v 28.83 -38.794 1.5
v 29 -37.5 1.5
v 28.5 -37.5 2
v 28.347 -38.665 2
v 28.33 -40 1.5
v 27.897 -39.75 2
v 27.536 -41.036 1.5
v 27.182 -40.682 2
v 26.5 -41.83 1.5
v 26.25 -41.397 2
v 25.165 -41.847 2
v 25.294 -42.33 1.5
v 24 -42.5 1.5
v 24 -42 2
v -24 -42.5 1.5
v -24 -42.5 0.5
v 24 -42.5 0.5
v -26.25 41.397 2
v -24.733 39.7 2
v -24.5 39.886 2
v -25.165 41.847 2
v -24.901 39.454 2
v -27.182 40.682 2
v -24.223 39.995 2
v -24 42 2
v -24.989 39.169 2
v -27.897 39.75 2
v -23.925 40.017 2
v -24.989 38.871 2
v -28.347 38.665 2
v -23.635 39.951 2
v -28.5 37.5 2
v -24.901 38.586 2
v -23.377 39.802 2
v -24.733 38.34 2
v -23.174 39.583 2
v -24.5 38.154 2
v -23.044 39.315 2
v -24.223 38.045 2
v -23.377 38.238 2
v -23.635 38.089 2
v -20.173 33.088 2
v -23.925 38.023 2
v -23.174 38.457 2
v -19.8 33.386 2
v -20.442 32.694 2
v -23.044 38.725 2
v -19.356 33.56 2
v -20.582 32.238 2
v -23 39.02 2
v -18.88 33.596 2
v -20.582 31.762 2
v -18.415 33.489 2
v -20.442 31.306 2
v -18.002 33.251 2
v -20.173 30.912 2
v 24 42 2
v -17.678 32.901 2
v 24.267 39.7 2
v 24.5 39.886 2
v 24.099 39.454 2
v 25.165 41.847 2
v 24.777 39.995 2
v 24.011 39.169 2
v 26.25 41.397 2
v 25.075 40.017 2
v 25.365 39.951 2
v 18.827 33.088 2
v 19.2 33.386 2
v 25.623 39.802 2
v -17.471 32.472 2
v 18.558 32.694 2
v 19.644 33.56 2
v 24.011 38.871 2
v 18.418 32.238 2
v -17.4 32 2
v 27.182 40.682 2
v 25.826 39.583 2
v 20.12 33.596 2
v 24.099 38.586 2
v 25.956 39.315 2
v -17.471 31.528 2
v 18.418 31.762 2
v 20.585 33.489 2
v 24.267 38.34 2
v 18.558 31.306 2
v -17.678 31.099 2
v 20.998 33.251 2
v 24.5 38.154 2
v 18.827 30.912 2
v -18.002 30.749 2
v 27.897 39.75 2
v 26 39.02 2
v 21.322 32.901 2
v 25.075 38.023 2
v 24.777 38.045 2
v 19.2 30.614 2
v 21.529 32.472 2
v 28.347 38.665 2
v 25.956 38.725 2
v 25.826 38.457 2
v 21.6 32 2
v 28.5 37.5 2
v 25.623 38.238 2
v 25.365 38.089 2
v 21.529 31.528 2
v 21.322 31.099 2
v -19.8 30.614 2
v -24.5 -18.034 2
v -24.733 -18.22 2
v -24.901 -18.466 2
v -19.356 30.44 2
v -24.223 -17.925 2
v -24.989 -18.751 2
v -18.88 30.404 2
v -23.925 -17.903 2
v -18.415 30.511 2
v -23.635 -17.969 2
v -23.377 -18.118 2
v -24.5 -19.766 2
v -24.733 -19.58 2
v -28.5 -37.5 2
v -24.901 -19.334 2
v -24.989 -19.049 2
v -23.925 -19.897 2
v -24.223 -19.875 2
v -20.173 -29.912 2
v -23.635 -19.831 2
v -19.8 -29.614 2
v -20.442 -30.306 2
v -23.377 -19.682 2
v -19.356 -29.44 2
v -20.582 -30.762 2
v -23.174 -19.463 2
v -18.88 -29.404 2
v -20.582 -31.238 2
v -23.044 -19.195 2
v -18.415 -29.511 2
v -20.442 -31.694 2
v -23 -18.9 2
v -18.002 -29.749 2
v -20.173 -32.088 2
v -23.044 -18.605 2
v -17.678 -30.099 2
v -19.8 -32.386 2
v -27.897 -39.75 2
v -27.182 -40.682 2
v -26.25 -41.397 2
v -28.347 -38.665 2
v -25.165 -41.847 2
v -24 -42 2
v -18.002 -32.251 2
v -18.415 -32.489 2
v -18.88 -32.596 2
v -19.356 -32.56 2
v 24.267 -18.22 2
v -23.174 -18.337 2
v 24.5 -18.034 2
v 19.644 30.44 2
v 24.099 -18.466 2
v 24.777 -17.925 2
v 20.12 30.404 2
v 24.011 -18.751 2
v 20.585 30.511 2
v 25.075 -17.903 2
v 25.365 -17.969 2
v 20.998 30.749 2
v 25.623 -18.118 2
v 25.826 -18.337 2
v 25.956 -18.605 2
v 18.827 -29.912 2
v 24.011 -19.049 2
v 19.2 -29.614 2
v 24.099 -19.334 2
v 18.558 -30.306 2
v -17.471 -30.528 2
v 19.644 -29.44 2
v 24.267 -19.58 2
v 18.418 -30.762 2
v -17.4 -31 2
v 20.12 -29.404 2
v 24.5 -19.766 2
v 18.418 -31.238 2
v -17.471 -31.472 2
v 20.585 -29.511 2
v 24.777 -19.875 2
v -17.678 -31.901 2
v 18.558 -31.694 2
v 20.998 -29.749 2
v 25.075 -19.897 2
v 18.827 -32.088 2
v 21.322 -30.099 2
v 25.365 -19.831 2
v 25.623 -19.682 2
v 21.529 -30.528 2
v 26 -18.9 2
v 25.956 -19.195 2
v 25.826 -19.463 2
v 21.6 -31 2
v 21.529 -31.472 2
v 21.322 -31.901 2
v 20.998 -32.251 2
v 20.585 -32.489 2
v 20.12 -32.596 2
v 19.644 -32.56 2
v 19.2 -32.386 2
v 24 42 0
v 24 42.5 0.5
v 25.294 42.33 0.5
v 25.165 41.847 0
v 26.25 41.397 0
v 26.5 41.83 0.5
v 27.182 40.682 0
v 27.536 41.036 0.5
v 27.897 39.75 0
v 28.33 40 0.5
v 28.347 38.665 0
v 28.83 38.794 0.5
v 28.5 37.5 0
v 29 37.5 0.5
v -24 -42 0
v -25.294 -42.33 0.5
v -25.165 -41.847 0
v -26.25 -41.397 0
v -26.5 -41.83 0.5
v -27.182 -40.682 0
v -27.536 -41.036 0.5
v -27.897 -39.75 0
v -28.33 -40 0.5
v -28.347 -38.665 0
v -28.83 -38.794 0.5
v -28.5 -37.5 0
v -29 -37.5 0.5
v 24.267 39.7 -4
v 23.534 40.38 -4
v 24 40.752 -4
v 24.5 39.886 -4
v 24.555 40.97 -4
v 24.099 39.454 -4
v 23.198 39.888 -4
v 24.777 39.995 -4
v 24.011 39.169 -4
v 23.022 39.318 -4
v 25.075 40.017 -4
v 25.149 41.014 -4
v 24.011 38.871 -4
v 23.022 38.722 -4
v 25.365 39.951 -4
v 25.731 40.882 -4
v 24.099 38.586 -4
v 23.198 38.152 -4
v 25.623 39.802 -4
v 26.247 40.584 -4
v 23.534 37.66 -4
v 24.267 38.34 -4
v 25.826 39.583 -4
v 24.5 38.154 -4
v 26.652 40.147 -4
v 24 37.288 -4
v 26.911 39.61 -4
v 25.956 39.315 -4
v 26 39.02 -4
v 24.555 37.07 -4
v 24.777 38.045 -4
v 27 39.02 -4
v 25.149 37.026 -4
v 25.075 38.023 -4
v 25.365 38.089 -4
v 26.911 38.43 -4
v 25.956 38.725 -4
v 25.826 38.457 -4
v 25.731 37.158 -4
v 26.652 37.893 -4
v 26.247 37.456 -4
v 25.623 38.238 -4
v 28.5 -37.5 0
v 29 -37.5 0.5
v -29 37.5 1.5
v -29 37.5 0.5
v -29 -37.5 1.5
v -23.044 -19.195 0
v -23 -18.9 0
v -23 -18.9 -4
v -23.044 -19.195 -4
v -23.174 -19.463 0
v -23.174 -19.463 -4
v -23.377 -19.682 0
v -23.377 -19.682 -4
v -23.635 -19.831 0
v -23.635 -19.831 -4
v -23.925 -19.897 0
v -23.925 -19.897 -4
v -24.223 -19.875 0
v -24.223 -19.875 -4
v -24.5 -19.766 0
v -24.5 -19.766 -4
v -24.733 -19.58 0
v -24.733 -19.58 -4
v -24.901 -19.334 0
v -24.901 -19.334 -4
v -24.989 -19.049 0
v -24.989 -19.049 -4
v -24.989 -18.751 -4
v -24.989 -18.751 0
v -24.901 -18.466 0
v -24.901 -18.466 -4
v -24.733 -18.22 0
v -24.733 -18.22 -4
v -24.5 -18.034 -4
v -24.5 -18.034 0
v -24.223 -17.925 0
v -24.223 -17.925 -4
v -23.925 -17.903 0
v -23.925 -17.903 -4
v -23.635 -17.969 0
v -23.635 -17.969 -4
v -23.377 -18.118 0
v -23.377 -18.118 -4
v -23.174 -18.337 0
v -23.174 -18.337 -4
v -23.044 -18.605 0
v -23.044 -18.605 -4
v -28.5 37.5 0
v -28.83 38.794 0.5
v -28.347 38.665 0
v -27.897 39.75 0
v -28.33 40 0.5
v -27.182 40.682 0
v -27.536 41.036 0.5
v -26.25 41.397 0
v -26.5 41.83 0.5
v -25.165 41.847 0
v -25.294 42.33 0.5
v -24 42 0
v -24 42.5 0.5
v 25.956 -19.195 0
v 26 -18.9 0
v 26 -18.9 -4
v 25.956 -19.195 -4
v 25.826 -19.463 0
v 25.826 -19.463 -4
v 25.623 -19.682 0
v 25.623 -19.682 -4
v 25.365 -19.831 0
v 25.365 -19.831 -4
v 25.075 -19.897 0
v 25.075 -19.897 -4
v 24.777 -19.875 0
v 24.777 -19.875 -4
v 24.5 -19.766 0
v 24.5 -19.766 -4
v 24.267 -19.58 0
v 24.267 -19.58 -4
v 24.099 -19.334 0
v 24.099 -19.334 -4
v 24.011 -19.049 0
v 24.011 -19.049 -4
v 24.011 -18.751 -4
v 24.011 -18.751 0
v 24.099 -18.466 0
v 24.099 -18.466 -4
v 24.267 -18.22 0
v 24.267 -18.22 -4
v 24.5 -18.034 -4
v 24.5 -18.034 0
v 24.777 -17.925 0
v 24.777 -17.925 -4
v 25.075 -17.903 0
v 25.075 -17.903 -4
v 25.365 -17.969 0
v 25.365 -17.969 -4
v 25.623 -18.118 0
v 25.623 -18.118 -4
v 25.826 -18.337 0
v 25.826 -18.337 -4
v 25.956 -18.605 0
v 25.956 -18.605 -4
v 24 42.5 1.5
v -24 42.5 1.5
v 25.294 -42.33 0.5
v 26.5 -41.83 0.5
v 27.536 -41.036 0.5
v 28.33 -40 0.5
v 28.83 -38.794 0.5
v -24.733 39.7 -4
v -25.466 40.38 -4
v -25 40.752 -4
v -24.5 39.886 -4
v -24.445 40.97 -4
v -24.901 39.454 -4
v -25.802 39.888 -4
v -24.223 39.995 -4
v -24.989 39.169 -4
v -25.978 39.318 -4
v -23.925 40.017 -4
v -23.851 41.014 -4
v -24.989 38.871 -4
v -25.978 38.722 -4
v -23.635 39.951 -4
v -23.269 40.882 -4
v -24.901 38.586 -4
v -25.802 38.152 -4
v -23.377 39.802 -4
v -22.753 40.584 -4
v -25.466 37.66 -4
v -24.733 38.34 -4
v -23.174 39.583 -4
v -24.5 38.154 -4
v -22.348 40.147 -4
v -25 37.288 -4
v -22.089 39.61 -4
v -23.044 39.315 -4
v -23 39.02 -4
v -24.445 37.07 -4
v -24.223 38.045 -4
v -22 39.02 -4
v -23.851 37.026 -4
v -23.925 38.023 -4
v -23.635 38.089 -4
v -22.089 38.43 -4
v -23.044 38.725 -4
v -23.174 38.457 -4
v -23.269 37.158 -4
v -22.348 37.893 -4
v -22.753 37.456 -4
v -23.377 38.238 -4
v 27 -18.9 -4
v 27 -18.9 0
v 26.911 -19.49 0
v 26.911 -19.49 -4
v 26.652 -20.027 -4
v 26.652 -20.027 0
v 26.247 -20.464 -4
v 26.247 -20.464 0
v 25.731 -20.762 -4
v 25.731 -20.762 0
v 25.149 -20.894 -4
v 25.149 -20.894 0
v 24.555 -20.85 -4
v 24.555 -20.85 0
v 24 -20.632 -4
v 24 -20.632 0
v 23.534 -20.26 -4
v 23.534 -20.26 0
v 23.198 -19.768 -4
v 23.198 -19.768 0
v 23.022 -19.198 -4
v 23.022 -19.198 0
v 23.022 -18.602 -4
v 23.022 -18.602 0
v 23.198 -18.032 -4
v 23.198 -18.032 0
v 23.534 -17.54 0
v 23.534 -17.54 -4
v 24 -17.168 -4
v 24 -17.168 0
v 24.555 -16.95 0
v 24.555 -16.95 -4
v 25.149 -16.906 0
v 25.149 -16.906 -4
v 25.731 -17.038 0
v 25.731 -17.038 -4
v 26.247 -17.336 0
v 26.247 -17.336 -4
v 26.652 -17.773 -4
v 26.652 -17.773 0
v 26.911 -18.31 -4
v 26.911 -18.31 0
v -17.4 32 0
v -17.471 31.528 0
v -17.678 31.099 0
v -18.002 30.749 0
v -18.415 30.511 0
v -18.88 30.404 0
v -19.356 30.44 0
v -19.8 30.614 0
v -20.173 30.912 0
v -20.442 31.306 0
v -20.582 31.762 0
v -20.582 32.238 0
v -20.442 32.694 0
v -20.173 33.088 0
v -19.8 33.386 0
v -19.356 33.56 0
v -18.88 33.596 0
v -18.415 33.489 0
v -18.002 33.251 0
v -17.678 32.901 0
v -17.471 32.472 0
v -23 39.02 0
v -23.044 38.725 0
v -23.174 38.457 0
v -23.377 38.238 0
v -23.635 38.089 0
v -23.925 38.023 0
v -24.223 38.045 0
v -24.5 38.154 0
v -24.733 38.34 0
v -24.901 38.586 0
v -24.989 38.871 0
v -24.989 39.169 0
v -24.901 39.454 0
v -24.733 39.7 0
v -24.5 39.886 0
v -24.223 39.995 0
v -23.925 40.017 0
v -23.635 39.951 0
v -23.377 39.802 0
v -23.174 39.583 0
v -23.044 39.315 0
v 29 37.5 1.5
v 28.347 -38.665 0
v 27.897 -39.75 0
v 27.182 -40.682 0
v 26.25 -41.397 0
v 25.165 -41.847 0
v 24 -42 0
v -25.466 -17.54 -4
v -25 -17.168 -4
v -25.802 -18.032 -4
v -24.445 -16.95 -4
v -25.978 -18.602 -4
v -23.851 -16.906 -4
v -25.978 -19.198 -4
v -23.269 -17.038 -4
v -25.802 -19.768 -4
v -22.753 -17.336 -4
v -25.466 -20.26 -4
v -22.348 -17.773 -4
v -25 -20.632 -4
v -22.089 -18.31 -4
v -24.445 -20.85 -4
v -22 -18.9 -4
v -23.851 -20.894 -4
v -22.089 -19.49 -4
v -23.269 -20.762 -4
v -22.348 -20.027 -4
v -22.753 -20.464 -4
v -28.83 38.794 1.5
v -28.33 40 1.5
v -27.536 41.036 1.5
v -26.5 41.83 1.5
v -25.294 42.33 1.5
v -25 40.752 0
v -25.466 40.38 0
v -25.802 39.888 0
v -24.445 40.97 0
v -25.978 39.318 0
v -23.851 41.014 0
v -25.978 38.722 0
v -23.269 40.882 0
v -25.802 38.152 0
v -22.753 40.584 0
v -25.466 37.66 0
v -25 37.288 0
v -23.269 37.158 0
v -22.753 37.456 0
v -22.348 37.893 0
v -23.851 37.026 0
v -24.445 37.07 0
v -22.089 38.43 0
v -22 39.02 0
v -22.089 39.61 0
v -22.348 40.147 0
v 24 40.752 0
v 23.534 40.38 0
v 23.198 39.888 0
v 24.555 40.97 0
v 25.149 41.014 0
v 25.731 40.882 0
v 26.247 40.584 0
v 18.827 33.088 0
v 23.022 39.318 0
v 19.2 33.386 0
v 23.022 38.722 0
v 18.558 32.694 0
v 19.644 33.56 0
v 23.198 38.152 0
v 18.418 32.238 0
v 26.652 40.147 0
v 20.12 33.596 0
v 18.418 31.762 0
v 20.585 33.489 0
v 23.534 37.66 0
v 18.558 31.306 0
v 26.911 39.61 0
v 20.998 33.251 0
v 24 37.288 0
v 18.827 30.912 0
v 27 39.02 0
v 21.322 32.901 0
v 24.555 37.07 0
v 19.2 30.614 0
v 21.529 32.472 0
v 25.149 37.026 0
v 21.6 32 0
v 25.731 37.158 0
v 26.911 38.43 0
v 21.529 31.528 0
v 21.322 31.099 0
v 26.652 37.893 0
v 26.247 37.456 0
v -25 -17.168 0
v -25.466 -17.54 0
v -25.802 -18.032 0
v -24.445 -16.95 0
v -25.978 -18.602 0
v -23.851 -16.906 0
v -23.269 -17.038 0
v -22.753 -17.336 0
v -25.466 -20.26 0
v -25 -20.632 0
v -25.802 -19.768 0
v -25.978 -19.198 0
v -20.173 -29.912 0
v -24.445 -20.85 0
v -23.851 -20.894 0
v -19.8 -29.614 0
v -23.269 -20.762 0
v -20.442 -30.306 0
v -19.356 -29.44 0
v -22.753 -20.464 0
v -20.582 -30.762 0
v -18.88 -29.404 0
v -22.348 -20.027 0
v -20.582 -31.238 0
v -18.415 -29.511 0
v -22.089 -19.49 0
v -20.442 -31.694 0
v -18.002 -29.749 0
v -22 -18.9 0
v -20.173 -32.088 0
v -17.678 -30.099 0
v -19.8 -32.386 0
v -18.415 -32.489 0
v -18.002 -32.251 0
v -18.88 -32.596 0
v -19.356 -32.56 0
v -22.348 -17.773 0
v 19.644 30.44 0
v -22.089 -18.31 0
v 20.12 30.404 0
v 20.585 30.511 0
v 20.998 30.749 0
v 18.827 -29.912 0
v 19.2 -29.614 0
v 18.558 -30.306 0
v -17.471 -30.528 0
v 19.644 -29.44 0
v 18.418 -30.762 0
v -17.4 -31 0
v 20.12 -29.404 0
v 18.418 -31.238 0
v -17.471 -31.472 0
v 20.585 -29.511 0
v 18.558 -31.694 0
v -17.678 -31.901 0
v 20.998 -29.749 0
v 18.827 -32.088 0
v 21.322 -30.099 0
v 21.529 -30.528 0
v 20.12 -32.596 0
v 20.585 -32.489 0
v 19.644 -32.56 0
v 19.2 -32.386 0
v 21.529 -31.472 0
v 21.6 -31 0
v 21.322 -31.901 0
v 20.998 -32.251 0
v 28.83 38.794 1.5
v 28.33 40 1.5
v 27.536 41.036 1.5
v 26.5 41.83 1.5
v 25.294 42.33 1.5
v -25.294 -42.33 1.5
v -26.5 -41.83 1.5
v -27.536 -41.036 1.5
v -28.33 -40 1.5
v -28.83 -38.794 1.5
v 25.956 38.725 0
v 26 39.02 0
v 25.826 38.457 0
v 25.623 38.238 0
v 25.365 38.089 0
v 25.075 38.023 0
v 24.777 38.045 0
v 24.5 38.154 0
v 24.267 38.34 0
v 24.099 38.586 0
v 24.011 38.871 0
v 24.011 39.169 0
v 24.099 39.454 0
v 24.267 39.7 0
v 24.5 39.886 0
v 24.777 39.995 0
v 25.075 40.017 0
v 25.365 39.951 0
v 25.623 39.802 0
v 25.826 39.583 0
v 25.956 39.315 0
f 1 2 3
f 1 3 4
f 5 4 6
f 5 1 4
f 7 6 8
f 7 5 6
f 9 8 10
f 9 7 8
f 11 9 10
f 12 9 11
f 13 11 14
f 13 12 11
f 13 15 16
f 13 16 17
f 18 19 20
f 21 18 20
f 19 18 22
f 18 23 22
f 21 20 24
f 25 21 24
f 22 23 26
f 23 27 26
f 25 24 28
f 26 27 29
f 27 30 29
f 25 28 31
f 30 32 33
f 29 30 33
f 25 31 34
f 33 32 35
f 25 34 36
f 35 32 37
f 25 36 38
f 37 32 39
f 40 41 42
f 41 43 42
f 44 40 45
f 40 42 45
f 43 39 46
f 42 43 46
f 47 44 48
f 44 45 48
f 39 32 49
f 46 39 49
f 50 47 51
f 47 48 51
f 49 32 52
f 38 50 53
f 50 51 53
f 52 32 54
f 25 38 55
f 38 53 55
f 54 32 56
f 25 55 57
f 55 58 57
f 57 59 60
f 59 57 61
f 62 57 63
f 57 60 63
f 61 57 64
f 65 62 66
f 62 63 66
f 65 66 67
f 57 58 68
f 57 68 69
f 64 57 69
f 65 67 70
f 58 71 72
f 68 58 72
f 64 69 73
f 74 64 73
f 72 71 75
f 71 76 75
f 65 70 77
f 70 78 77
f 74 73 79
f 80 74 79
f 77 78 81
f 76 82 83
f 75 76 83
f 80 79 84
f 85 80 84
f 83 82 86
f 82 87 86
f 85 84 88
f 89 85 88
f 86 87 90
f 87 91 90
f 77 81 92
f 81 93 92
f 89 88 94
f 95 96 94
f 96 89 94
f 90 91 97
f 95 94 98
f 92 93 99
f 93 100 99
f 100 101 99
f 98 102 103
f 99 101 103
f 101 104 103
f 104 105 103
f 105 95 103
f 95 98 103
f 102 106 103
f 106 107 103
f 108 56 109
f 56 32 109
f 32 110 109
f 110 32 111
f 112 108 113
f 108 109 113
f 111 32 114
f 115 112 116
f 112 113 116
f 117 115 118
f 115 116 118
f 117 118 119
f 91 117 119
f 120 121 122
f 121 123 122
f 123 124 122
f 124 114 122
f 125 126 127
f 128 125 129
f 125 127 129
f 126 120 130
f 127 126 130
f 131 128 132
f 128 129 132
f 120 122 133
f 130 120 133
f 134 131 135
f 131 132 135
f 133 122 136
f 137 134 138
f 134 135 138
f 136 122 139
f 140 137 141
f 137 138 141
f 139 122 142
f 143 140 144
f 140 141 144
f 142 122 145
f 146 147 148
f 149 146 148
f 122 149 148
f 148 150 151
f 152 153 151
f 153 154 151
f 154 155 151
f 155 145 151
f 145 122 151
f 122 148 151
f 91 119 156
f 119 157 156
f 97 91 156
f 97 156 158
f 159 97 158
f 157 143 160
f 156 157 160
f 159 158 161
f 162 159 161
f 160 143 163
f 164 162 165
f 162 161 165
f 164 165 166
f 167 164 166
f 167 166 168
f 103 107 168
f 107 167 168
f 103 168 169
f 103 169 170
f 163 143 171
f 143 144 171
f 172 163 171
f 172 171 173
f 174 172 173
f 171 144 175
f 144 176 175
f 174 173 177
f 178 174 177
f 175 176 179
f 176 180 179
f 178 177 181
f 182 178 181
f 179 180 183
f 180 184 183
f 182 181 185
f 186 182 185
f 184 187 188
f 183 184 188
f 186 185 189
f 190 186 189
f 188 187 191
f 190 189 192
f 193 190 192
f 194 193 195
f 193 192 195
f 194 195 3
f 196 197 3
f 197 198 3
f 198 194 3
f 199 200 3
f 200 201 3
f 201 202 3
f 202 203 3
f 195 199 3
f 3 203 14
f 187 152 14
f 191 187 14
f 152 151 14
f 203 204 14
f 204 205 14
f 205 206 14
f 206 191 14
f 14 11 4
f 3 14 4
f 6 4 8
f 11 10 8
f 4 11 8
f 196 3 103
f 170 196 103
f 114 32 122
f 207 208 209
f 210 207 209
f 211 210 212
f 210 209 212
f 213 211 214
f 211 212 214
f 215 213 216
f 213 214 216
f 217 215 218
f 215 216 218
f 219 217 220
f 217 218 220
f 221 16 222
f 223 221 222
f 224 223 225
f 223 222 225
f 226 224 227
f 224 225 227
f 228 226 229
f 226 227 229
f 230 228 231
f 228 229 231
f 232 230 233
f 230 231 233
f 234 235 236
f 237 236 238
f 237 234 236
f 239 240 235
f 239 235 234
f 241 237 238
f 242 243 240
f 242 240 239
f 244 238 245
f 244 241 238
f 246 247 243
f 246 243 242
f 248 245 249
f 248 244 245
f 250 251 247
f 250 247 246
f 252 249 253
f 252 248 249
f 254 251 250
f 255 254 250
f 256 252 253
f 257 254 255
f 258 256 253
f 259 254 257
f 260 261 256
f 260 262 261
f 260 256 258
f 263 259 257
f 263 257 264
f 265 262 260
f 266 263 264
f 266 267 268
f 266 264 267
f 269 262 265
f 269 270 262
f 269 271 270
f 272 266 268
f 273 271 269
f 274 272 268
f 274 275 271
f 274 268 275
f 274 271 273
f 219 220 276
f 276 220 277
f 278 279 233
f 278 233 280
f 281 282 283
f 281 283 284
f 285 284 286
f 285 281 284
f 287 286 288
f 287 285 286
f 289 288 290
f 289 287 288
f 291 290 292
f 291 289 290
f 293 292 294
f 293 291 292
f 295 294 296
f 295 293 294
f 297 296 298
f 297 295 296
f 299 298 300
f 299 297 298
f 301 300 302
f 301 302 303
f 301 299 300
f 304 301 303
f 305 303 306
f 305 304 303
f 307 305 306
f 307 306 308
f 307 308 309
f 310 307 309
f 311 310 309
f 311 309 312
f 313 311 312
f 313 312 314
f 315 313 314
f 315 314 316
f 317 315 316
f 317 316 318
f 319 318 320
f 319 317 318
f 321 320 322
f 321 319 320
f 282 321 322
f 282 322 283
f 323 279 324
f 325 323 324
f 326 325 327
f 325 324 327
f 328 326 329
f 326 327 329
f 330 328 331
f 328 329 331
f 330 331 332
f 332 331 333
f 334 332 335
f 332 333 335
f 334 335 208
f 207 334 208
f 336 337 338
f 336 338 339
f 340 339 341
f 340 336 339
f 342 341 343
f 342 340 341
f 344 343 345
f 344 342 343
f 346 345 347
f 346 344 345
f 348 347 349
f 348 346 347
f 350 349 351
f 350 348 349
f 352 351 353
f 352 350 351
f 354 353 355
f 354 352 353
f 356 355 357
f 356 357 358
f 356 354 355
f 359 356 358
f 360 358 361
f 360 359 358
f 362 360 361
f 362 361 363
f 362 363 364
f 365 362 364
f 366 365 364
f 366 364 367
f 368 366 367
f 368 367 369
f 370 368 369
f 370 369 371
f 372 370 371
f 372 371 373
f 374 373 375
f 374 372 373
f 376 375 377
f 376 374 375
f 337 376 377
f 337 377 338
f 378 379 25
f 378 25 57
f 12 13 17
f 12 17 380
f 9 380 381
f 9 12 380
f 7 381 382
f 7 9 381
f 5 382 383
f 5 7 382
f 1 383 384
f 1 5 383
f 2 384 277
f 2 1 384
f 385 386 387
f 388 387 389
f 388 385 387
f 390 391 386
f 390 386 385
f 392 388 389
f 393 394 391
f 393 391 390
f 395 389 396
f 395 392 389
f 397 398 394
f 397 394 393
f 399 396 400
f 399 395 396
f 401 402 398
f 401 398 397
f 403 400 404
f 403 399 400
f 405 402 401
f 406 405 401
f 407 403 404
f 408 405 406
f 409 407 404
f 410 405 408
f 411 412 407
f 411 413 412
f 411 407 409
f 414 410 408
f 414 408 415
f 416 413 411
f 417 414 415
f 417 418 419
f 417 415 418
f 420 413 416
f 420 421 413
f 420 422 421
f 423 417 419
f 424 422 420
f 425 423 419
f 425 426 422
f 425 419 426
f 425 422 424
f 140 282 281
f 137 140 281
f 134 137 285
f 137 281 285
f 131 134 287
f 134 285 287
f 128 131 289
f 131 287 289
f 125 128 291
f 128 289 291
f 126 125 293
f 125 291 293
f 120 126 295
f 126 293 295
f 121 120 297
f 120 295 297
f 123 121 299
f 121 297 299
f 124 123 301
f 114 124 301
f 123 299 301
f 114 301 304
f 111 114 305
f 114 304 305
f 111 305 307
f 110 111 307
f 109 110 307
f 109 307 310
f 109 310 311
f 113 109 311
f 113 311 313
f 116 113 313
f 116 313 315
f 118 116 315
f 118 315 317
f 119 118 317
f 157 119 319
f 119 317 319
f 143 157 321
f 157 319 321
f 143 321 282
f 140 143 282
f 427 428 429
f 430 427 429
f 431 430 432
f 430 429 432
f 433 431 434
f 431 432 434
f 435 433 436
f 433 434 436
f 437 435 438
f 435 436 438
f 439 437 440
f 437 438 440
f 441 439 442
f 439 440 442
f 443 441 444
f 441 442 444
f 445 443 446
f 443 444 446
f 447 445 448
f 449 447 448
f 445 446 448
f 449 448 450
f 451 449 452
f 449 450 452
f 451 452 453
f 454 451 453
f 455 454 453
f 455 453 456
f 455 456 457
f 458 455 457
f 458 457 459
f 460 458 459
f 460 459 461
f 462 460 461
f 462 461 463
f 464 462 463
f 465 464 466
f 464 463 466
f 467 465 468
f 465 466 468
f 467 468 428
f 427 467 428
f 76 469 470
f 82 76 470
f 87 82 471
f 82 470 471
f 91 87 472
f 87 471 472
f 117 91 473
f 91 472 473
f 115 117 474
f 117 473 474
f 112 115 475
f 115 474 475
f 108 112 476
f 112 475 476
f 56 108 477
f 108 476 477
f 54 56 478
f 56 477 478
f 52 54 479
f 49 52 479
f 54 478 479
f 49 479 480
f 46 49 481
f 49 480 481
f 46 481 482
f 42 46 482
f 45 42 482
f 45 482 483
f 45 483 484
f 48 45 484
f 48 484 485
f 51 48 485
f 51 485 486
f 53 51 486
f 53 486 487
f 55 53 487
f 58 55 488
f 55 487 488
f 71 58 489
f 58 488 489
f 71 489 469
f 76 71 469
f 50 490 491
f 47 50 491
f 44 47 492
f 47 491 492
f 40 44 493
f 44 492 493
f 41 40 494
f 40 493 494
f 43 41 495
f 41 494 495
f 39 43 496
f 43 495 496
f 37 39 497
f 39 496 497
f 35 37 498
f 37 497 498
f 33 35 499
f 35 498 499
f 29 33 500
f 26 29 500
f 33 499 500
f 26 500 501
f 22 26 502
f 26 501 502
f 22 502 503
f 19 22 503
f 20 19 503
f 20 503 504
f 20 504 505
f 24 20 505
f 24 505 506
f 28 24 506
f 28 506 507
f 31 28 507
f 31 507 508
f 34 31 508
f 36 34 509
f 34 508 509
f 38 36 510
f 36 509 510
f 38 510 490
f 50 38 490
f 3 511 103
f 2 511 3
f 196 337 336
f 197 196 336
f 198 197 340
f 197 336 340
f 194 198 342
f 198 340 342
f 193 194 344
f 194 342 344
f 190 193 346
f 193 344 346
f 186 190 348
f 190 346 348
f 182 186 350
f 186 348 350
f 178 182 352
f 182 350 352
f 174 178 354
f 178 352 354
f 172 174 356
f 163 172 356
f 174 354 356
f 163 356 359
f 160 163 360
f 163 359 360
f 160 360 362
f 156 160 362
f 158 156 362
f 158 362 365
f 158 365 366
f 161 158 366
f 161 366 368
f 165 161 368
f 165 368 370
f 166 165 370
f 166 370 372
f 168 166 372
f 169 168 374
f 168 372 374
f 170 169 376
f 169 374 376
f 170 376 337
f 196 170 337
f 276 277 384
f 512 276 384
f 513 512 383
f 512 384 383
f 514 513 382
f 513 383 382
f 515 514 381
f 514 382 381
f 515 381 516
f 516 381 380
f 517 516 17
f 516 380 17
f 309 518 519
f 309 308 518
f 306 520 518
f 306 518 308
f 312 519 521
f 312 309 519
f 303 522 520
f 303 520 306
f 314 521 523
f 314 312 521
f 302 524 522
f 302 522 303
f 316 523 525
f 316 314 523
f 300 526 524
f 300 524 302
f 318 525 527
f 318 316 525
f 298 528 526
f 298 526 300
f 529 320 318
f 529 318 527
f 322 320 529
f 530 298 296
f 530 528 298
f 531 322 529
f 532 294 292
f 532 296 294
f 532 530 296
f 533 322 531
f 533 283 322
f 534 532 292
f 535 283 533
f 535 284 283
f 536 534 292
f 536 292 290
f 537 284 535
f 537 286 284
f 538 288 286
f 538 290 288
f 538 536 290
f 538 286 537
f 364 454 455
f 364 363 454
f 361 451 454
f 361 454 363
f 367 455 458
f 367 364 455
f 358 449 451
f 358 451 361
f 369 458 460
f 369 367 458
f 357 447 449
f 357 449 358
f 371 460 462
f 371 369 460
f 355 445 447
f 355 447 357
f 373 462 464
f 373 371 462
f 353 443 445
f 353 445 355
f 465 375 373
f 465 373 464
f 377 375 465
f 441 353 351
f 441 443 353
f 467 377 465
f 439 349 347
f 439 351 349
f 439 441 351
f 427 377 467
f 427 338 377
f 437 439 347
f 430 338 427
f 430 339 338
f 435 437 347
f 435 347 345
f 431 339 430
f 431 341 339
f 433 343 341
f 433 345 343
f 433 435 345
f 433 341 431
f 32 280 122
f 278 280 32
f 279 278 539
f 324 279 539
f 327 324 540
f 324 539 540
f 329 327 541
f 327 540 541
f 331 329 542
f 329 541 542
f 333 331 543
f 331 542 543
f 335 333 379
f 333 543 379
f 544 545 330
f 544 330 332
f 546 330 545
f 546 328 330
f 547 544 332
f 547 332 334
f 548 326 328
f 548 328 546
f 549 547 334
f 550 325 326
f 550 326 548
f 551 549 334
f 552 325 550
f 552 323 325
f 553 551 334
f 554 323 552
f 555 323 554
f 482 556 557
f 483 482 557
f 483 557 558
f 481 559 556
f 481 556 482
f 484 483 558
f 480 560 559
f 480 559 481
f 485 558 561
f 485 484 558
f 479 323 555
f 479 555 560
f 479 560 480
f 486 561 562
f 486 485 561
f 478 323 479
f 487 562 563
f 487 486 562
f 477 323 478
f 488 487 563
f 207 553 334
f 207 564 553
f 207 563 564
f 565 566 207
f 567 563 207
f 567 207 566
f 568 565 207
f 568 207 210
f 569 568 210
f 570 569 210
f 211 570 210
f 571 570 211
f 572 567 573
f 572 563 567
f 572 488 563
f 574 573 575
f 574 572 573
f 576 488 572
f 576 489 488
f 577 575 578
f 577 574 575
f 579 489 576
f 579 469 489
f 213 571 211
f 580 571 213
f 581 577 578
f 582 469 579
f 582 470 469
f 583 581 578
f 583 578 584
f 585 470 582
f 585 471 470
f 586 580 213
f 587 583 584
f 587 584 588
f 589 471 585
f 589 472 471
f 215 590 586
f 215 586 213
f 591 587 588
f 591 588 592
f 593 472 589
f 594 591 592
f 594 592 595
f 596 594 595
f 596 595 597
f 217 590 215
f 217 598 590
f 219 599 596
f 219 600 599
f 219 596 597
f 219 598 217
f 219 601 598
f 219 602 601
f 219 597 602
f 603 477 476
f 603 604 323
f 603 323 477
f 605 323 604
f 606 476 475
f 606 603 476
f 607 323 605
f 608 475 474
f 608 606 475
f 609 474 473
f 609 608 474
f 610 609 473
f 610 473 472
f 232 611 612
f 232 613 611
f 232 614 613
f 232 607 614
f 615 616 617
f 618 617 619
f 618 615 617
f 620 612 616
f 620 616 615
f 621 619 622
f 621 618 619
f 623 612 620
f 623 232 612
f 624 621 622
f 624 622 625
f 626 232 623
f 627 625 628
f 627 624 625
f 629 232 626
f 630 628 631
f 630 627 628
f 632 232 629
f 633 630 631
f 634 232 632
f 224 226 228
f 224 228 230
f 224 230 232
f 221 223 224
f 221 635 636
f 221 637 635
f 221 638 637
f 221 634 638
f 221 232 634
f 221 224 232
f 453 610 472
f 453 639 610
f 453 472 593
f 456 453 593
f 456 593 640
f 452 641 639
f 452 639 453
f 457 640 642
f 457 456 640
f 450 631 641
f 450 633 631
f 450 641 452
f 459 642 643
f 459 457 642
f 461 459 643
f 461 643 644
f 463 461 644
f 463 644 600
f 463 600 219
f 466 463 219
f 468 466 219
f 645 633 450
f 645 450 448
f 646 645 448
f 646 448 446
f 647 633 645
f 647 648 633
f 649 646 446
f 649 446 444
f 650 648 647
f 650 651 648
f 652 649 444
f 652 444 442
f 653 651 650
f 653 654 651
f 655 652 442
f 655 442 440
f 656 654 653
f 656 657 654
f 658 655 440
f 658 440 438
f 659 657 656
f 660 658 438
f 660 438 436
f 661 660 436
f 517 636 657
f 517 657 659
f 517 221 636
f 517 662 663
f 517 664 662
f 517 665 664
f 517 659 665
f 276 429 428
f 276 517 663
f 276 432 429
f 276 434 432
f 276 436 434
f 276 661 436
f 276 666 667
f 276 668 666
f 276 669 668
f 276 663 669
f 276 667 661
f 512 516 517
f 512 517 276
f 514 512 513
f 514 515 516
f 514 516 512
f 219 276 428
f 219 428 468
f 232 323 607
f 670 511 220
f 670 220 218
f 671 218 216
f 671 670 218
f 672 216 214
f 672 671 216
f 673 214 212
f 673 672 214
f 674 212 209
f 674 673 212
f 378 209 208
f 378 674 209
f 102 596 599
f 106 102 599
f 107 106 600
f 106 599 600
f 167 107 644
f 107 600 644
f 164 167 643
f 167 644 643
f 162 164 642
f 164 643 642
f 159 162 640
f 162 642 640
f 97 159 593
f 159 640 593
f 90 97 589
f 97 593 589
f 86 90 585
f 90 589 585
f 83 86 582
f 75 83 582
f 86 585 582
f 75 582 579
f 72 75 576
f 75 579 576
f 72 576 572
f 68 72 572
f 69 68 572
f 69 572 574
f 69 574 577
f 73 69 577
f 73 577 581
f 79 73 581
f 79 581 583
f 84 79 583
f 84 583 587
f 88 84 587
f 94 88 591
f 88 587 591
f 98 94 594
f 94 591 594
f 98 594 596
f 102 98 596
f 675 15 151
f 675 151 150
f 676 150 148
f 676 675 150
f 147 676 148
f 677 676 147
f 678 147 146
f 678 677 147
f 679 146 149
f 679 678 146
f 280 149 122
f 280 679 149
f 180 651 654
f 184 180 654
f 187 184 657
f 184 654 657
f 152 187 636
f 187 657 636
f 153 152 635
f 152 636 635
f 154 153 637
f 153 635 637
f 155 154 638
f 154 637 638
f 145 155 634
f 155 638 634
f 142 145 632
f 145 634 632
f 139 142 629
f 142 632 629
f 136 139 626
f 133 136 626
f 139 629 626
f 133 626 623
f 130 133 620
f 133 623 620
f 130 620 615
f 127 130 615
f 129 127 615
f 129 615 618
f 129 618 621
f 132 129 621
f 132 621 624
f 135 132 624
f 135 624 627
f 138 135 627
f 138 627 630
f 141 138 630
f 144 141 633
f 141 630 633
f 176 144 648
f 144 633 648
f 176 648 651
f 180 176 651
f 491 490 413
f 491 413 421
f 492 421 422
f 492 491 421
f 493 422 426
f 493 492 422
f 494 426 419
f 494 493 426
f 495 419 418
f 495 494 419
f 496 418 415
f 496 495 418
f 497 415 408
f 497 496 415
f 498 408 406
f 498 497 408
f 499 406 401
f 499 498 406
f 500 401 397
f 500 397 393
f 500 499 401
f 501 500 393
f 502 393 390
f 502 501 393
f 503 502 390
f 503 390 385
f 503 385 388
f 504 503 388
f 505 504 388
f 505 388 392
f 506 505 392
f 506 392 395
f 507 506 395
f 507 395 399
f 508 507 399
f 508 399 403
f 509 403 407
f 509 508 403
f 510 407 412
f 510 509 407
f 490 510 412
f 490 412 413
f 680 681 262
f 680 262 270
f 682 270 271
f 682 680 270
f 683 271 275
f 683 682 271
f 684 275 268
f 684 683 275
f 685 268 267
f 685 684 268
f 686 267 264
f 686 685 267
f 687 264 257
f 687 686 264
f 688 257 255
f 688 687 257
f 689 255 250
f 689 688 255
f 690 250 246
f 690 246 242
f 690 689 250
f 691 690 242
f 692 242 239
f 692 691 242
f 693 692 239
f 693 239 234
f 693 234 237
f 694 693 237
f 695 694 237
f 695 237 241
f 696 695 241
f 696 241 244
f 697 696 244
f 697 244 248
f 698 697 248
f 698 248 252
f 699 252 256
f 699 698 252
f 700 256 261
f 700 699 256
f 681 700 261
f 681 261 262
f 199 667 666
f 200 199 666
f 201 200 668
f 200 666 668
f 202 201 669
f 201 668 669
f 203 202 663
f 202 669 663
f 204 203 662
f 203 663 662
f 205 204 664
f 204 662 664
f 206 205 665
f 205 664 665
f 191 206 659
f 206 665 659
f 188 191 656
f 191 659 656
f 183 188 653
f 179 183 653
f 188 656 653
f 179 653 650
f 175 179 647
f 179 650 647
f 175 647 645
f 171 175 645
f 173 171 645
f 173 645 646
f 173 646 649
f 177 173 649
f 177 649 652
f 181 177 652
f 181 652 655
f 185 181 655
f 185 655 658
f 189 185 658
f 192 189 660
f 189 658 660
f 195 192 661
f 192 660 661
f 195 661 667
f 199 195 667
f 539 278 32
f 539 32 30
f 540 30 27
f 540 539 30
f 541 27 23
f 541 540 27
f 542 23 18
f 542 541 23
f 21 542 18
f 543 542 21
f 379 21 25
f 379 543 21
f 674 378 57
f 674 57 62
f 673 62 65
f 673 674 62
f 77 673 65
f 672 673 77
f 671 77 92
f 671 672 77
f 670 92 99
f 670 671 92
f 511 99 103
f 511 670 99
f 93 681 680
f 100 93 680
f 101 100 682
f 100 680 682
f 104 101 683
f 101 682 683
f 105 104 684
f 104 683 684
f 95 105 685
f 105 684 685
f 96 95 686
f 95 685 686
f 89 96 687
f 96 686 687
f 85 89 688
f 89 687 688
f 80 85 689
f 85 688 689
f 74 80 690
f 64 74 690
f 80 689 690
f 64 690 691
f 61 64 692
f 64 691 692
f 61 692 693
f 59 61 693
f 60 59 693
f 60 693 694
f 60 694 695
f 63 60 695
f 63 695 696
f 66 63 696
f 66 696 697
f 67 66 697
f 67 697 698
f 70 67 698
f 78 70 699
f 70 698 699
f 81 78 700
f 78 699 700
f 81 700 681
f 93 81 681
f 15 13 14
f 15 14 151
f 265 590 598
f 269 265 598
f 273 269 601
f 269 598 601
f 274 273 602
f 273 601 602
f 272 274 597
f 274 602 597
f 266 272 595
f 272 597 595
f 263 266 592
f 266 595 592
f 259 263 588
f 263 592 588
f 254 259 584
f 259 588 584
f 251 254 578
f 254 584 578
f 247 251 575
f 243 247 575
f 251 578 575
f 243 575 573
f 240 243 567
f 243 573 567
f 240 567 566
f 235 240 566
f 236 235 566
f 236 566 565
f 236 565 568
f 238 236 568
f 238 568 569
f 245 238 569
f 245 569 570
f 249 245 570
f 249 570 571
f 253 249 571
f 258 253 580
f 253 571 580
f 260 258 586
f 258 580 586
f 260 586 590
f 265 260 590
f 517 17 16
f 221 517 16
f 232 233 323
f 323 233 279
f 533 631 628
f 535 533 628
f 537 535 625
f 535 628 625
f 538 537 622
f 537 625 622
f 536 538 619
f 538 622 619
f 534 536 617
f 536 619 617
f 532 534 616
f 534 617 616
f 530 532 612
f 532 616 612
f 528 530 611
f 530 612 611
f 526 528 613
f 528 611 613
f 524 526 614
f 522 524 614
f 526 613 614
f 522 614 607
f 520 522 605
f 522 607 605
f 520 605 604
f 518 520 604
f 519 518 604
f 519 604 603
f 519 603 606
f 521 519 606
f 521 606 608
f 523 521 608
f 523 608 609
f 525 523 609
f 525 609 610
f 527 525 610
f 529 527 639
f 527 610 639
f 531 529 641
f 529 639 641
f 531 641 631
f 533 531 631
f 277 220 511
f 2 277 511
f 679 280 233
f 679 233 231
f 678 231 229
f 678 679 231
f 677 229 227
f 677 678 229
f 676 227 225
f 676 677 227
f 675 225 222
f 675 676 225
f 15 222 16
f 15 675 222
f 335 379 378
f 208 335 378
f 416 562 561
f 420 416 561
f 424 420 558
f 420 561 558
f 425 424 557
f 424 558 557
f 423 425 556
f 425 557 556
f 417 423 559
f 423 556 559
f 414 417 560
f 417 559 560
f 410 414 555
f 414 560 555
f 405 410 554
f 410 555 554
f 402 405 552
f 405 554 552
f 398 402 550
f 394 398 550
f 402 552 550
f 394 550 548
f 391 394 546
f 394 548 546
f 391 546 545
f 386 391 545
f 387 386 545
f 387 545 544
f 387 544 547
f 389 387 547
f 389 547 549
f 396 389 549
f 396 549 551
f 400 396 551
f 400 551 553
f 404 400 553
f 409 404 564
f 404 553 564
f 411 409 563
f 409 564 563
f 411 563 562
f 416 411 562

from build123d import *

# Parameters (mm, degrees)
F0_W      = 58
F0_H      = 2
F1_DEPTH  = 42.5
F2_R      = 5
F3_R      = 2
F3_R_2    = 1
F4_DEPTH  = 4
F4_FACE_R = 1
F3_R_3    = 1.6
F5_DEPTH  = 2
F6_SIZE   = 0.5


with BuildPart() as f1:
    # F0 (on Front) → F1 (new body, symmetric)
    with BuildSketch(Plane.XZ):
        with Locations((0, 1)):
            Rectangle(F0_W, F0_H)
    extrude(amount=F1_DEPTH, both=True)

    # F2
    f2_edges = [f1.edges().sort_by_distance(p)[0] for p in [
        (-29, 42.5, 1),
        (29, 42.5, 1),
        (29, -42.5, 1),
        (-29, -42.5, 1),
    ]]
    fillet(f2_edges, radius=F2_R)

    # F3 (on face) → F4 (join)
    with BuildSketch(Plane(origin=(0, 0, 0), x_dir=(1, 0, 0), z_dir=(0, 0, -1))):
        with Locations((-24, -39.02)):
            Circle(F3_R)
        with Locations((-24, -39.02)):
            Circle(F3_R_2, mode=Mode.SUBTRACT)
        with Locations((-24, 18.9)):
            Circle(F3_R)
        with Locations((-24, 18.9)):
            Circle(F3_R_2, mode=Mode.SUBTRACT)
        with Locations((25, -39.02)):
            Circle(F3_R)
        with Locations((25, -39.02)):
            Circle(F3_R_2, mode=Mode.SUBTRACT)
        with Locations((25, 18.9)):
            Circle(F3_R)
        with Locations((25, 18.9)):
            Circle(F3_R_2, mode=Mode.SUBTRACT)
    extrude(amount=F4_DEPTH)

    # F4_face (on face) + F3 (on face) → F5 (cut, through all)
    with BuildSketch(Plane(origin=(-24, 39.02, 0), x_dir=(1, 0, 0), z_dir=(0, 0, -1))):
        Circle(F4_FACE_R)
        with Locations((0, 57.92)):
            Circle(F4_FACE_R)
        with Locations((49, 57.92)):
            Circle(F4_FACE_R)
        with Locations((49, 0)):
            Circle(F4_FACE_R)
    with BuildSketch(Plane(origin=(0, 0, 0), x_dir=(1, 0, 0), z_dir=(0, 0, -1))):
        with Locations((-19, -32)):
            Circle(F3_R_3)
        with Locations((20, -32)):
            Circle(F3_R_3)
        with Locations((-19, 31)):
            Circle(F3_R_3)
        with Locations((20, 31)):
            Circle(F3_R_3)
    extrude(amount=-F5_DEPTH, mode=Mode.SUBTRACT)

    # F6
    f6_edges = [f1.edges().sort_by_distance(p)[0] for p in [
        (0, 42.5, 2),
        (29, 0, 0),
    ]]
    chamfer(f6_edges, length=F6_SIZE)


solid = f1.part
